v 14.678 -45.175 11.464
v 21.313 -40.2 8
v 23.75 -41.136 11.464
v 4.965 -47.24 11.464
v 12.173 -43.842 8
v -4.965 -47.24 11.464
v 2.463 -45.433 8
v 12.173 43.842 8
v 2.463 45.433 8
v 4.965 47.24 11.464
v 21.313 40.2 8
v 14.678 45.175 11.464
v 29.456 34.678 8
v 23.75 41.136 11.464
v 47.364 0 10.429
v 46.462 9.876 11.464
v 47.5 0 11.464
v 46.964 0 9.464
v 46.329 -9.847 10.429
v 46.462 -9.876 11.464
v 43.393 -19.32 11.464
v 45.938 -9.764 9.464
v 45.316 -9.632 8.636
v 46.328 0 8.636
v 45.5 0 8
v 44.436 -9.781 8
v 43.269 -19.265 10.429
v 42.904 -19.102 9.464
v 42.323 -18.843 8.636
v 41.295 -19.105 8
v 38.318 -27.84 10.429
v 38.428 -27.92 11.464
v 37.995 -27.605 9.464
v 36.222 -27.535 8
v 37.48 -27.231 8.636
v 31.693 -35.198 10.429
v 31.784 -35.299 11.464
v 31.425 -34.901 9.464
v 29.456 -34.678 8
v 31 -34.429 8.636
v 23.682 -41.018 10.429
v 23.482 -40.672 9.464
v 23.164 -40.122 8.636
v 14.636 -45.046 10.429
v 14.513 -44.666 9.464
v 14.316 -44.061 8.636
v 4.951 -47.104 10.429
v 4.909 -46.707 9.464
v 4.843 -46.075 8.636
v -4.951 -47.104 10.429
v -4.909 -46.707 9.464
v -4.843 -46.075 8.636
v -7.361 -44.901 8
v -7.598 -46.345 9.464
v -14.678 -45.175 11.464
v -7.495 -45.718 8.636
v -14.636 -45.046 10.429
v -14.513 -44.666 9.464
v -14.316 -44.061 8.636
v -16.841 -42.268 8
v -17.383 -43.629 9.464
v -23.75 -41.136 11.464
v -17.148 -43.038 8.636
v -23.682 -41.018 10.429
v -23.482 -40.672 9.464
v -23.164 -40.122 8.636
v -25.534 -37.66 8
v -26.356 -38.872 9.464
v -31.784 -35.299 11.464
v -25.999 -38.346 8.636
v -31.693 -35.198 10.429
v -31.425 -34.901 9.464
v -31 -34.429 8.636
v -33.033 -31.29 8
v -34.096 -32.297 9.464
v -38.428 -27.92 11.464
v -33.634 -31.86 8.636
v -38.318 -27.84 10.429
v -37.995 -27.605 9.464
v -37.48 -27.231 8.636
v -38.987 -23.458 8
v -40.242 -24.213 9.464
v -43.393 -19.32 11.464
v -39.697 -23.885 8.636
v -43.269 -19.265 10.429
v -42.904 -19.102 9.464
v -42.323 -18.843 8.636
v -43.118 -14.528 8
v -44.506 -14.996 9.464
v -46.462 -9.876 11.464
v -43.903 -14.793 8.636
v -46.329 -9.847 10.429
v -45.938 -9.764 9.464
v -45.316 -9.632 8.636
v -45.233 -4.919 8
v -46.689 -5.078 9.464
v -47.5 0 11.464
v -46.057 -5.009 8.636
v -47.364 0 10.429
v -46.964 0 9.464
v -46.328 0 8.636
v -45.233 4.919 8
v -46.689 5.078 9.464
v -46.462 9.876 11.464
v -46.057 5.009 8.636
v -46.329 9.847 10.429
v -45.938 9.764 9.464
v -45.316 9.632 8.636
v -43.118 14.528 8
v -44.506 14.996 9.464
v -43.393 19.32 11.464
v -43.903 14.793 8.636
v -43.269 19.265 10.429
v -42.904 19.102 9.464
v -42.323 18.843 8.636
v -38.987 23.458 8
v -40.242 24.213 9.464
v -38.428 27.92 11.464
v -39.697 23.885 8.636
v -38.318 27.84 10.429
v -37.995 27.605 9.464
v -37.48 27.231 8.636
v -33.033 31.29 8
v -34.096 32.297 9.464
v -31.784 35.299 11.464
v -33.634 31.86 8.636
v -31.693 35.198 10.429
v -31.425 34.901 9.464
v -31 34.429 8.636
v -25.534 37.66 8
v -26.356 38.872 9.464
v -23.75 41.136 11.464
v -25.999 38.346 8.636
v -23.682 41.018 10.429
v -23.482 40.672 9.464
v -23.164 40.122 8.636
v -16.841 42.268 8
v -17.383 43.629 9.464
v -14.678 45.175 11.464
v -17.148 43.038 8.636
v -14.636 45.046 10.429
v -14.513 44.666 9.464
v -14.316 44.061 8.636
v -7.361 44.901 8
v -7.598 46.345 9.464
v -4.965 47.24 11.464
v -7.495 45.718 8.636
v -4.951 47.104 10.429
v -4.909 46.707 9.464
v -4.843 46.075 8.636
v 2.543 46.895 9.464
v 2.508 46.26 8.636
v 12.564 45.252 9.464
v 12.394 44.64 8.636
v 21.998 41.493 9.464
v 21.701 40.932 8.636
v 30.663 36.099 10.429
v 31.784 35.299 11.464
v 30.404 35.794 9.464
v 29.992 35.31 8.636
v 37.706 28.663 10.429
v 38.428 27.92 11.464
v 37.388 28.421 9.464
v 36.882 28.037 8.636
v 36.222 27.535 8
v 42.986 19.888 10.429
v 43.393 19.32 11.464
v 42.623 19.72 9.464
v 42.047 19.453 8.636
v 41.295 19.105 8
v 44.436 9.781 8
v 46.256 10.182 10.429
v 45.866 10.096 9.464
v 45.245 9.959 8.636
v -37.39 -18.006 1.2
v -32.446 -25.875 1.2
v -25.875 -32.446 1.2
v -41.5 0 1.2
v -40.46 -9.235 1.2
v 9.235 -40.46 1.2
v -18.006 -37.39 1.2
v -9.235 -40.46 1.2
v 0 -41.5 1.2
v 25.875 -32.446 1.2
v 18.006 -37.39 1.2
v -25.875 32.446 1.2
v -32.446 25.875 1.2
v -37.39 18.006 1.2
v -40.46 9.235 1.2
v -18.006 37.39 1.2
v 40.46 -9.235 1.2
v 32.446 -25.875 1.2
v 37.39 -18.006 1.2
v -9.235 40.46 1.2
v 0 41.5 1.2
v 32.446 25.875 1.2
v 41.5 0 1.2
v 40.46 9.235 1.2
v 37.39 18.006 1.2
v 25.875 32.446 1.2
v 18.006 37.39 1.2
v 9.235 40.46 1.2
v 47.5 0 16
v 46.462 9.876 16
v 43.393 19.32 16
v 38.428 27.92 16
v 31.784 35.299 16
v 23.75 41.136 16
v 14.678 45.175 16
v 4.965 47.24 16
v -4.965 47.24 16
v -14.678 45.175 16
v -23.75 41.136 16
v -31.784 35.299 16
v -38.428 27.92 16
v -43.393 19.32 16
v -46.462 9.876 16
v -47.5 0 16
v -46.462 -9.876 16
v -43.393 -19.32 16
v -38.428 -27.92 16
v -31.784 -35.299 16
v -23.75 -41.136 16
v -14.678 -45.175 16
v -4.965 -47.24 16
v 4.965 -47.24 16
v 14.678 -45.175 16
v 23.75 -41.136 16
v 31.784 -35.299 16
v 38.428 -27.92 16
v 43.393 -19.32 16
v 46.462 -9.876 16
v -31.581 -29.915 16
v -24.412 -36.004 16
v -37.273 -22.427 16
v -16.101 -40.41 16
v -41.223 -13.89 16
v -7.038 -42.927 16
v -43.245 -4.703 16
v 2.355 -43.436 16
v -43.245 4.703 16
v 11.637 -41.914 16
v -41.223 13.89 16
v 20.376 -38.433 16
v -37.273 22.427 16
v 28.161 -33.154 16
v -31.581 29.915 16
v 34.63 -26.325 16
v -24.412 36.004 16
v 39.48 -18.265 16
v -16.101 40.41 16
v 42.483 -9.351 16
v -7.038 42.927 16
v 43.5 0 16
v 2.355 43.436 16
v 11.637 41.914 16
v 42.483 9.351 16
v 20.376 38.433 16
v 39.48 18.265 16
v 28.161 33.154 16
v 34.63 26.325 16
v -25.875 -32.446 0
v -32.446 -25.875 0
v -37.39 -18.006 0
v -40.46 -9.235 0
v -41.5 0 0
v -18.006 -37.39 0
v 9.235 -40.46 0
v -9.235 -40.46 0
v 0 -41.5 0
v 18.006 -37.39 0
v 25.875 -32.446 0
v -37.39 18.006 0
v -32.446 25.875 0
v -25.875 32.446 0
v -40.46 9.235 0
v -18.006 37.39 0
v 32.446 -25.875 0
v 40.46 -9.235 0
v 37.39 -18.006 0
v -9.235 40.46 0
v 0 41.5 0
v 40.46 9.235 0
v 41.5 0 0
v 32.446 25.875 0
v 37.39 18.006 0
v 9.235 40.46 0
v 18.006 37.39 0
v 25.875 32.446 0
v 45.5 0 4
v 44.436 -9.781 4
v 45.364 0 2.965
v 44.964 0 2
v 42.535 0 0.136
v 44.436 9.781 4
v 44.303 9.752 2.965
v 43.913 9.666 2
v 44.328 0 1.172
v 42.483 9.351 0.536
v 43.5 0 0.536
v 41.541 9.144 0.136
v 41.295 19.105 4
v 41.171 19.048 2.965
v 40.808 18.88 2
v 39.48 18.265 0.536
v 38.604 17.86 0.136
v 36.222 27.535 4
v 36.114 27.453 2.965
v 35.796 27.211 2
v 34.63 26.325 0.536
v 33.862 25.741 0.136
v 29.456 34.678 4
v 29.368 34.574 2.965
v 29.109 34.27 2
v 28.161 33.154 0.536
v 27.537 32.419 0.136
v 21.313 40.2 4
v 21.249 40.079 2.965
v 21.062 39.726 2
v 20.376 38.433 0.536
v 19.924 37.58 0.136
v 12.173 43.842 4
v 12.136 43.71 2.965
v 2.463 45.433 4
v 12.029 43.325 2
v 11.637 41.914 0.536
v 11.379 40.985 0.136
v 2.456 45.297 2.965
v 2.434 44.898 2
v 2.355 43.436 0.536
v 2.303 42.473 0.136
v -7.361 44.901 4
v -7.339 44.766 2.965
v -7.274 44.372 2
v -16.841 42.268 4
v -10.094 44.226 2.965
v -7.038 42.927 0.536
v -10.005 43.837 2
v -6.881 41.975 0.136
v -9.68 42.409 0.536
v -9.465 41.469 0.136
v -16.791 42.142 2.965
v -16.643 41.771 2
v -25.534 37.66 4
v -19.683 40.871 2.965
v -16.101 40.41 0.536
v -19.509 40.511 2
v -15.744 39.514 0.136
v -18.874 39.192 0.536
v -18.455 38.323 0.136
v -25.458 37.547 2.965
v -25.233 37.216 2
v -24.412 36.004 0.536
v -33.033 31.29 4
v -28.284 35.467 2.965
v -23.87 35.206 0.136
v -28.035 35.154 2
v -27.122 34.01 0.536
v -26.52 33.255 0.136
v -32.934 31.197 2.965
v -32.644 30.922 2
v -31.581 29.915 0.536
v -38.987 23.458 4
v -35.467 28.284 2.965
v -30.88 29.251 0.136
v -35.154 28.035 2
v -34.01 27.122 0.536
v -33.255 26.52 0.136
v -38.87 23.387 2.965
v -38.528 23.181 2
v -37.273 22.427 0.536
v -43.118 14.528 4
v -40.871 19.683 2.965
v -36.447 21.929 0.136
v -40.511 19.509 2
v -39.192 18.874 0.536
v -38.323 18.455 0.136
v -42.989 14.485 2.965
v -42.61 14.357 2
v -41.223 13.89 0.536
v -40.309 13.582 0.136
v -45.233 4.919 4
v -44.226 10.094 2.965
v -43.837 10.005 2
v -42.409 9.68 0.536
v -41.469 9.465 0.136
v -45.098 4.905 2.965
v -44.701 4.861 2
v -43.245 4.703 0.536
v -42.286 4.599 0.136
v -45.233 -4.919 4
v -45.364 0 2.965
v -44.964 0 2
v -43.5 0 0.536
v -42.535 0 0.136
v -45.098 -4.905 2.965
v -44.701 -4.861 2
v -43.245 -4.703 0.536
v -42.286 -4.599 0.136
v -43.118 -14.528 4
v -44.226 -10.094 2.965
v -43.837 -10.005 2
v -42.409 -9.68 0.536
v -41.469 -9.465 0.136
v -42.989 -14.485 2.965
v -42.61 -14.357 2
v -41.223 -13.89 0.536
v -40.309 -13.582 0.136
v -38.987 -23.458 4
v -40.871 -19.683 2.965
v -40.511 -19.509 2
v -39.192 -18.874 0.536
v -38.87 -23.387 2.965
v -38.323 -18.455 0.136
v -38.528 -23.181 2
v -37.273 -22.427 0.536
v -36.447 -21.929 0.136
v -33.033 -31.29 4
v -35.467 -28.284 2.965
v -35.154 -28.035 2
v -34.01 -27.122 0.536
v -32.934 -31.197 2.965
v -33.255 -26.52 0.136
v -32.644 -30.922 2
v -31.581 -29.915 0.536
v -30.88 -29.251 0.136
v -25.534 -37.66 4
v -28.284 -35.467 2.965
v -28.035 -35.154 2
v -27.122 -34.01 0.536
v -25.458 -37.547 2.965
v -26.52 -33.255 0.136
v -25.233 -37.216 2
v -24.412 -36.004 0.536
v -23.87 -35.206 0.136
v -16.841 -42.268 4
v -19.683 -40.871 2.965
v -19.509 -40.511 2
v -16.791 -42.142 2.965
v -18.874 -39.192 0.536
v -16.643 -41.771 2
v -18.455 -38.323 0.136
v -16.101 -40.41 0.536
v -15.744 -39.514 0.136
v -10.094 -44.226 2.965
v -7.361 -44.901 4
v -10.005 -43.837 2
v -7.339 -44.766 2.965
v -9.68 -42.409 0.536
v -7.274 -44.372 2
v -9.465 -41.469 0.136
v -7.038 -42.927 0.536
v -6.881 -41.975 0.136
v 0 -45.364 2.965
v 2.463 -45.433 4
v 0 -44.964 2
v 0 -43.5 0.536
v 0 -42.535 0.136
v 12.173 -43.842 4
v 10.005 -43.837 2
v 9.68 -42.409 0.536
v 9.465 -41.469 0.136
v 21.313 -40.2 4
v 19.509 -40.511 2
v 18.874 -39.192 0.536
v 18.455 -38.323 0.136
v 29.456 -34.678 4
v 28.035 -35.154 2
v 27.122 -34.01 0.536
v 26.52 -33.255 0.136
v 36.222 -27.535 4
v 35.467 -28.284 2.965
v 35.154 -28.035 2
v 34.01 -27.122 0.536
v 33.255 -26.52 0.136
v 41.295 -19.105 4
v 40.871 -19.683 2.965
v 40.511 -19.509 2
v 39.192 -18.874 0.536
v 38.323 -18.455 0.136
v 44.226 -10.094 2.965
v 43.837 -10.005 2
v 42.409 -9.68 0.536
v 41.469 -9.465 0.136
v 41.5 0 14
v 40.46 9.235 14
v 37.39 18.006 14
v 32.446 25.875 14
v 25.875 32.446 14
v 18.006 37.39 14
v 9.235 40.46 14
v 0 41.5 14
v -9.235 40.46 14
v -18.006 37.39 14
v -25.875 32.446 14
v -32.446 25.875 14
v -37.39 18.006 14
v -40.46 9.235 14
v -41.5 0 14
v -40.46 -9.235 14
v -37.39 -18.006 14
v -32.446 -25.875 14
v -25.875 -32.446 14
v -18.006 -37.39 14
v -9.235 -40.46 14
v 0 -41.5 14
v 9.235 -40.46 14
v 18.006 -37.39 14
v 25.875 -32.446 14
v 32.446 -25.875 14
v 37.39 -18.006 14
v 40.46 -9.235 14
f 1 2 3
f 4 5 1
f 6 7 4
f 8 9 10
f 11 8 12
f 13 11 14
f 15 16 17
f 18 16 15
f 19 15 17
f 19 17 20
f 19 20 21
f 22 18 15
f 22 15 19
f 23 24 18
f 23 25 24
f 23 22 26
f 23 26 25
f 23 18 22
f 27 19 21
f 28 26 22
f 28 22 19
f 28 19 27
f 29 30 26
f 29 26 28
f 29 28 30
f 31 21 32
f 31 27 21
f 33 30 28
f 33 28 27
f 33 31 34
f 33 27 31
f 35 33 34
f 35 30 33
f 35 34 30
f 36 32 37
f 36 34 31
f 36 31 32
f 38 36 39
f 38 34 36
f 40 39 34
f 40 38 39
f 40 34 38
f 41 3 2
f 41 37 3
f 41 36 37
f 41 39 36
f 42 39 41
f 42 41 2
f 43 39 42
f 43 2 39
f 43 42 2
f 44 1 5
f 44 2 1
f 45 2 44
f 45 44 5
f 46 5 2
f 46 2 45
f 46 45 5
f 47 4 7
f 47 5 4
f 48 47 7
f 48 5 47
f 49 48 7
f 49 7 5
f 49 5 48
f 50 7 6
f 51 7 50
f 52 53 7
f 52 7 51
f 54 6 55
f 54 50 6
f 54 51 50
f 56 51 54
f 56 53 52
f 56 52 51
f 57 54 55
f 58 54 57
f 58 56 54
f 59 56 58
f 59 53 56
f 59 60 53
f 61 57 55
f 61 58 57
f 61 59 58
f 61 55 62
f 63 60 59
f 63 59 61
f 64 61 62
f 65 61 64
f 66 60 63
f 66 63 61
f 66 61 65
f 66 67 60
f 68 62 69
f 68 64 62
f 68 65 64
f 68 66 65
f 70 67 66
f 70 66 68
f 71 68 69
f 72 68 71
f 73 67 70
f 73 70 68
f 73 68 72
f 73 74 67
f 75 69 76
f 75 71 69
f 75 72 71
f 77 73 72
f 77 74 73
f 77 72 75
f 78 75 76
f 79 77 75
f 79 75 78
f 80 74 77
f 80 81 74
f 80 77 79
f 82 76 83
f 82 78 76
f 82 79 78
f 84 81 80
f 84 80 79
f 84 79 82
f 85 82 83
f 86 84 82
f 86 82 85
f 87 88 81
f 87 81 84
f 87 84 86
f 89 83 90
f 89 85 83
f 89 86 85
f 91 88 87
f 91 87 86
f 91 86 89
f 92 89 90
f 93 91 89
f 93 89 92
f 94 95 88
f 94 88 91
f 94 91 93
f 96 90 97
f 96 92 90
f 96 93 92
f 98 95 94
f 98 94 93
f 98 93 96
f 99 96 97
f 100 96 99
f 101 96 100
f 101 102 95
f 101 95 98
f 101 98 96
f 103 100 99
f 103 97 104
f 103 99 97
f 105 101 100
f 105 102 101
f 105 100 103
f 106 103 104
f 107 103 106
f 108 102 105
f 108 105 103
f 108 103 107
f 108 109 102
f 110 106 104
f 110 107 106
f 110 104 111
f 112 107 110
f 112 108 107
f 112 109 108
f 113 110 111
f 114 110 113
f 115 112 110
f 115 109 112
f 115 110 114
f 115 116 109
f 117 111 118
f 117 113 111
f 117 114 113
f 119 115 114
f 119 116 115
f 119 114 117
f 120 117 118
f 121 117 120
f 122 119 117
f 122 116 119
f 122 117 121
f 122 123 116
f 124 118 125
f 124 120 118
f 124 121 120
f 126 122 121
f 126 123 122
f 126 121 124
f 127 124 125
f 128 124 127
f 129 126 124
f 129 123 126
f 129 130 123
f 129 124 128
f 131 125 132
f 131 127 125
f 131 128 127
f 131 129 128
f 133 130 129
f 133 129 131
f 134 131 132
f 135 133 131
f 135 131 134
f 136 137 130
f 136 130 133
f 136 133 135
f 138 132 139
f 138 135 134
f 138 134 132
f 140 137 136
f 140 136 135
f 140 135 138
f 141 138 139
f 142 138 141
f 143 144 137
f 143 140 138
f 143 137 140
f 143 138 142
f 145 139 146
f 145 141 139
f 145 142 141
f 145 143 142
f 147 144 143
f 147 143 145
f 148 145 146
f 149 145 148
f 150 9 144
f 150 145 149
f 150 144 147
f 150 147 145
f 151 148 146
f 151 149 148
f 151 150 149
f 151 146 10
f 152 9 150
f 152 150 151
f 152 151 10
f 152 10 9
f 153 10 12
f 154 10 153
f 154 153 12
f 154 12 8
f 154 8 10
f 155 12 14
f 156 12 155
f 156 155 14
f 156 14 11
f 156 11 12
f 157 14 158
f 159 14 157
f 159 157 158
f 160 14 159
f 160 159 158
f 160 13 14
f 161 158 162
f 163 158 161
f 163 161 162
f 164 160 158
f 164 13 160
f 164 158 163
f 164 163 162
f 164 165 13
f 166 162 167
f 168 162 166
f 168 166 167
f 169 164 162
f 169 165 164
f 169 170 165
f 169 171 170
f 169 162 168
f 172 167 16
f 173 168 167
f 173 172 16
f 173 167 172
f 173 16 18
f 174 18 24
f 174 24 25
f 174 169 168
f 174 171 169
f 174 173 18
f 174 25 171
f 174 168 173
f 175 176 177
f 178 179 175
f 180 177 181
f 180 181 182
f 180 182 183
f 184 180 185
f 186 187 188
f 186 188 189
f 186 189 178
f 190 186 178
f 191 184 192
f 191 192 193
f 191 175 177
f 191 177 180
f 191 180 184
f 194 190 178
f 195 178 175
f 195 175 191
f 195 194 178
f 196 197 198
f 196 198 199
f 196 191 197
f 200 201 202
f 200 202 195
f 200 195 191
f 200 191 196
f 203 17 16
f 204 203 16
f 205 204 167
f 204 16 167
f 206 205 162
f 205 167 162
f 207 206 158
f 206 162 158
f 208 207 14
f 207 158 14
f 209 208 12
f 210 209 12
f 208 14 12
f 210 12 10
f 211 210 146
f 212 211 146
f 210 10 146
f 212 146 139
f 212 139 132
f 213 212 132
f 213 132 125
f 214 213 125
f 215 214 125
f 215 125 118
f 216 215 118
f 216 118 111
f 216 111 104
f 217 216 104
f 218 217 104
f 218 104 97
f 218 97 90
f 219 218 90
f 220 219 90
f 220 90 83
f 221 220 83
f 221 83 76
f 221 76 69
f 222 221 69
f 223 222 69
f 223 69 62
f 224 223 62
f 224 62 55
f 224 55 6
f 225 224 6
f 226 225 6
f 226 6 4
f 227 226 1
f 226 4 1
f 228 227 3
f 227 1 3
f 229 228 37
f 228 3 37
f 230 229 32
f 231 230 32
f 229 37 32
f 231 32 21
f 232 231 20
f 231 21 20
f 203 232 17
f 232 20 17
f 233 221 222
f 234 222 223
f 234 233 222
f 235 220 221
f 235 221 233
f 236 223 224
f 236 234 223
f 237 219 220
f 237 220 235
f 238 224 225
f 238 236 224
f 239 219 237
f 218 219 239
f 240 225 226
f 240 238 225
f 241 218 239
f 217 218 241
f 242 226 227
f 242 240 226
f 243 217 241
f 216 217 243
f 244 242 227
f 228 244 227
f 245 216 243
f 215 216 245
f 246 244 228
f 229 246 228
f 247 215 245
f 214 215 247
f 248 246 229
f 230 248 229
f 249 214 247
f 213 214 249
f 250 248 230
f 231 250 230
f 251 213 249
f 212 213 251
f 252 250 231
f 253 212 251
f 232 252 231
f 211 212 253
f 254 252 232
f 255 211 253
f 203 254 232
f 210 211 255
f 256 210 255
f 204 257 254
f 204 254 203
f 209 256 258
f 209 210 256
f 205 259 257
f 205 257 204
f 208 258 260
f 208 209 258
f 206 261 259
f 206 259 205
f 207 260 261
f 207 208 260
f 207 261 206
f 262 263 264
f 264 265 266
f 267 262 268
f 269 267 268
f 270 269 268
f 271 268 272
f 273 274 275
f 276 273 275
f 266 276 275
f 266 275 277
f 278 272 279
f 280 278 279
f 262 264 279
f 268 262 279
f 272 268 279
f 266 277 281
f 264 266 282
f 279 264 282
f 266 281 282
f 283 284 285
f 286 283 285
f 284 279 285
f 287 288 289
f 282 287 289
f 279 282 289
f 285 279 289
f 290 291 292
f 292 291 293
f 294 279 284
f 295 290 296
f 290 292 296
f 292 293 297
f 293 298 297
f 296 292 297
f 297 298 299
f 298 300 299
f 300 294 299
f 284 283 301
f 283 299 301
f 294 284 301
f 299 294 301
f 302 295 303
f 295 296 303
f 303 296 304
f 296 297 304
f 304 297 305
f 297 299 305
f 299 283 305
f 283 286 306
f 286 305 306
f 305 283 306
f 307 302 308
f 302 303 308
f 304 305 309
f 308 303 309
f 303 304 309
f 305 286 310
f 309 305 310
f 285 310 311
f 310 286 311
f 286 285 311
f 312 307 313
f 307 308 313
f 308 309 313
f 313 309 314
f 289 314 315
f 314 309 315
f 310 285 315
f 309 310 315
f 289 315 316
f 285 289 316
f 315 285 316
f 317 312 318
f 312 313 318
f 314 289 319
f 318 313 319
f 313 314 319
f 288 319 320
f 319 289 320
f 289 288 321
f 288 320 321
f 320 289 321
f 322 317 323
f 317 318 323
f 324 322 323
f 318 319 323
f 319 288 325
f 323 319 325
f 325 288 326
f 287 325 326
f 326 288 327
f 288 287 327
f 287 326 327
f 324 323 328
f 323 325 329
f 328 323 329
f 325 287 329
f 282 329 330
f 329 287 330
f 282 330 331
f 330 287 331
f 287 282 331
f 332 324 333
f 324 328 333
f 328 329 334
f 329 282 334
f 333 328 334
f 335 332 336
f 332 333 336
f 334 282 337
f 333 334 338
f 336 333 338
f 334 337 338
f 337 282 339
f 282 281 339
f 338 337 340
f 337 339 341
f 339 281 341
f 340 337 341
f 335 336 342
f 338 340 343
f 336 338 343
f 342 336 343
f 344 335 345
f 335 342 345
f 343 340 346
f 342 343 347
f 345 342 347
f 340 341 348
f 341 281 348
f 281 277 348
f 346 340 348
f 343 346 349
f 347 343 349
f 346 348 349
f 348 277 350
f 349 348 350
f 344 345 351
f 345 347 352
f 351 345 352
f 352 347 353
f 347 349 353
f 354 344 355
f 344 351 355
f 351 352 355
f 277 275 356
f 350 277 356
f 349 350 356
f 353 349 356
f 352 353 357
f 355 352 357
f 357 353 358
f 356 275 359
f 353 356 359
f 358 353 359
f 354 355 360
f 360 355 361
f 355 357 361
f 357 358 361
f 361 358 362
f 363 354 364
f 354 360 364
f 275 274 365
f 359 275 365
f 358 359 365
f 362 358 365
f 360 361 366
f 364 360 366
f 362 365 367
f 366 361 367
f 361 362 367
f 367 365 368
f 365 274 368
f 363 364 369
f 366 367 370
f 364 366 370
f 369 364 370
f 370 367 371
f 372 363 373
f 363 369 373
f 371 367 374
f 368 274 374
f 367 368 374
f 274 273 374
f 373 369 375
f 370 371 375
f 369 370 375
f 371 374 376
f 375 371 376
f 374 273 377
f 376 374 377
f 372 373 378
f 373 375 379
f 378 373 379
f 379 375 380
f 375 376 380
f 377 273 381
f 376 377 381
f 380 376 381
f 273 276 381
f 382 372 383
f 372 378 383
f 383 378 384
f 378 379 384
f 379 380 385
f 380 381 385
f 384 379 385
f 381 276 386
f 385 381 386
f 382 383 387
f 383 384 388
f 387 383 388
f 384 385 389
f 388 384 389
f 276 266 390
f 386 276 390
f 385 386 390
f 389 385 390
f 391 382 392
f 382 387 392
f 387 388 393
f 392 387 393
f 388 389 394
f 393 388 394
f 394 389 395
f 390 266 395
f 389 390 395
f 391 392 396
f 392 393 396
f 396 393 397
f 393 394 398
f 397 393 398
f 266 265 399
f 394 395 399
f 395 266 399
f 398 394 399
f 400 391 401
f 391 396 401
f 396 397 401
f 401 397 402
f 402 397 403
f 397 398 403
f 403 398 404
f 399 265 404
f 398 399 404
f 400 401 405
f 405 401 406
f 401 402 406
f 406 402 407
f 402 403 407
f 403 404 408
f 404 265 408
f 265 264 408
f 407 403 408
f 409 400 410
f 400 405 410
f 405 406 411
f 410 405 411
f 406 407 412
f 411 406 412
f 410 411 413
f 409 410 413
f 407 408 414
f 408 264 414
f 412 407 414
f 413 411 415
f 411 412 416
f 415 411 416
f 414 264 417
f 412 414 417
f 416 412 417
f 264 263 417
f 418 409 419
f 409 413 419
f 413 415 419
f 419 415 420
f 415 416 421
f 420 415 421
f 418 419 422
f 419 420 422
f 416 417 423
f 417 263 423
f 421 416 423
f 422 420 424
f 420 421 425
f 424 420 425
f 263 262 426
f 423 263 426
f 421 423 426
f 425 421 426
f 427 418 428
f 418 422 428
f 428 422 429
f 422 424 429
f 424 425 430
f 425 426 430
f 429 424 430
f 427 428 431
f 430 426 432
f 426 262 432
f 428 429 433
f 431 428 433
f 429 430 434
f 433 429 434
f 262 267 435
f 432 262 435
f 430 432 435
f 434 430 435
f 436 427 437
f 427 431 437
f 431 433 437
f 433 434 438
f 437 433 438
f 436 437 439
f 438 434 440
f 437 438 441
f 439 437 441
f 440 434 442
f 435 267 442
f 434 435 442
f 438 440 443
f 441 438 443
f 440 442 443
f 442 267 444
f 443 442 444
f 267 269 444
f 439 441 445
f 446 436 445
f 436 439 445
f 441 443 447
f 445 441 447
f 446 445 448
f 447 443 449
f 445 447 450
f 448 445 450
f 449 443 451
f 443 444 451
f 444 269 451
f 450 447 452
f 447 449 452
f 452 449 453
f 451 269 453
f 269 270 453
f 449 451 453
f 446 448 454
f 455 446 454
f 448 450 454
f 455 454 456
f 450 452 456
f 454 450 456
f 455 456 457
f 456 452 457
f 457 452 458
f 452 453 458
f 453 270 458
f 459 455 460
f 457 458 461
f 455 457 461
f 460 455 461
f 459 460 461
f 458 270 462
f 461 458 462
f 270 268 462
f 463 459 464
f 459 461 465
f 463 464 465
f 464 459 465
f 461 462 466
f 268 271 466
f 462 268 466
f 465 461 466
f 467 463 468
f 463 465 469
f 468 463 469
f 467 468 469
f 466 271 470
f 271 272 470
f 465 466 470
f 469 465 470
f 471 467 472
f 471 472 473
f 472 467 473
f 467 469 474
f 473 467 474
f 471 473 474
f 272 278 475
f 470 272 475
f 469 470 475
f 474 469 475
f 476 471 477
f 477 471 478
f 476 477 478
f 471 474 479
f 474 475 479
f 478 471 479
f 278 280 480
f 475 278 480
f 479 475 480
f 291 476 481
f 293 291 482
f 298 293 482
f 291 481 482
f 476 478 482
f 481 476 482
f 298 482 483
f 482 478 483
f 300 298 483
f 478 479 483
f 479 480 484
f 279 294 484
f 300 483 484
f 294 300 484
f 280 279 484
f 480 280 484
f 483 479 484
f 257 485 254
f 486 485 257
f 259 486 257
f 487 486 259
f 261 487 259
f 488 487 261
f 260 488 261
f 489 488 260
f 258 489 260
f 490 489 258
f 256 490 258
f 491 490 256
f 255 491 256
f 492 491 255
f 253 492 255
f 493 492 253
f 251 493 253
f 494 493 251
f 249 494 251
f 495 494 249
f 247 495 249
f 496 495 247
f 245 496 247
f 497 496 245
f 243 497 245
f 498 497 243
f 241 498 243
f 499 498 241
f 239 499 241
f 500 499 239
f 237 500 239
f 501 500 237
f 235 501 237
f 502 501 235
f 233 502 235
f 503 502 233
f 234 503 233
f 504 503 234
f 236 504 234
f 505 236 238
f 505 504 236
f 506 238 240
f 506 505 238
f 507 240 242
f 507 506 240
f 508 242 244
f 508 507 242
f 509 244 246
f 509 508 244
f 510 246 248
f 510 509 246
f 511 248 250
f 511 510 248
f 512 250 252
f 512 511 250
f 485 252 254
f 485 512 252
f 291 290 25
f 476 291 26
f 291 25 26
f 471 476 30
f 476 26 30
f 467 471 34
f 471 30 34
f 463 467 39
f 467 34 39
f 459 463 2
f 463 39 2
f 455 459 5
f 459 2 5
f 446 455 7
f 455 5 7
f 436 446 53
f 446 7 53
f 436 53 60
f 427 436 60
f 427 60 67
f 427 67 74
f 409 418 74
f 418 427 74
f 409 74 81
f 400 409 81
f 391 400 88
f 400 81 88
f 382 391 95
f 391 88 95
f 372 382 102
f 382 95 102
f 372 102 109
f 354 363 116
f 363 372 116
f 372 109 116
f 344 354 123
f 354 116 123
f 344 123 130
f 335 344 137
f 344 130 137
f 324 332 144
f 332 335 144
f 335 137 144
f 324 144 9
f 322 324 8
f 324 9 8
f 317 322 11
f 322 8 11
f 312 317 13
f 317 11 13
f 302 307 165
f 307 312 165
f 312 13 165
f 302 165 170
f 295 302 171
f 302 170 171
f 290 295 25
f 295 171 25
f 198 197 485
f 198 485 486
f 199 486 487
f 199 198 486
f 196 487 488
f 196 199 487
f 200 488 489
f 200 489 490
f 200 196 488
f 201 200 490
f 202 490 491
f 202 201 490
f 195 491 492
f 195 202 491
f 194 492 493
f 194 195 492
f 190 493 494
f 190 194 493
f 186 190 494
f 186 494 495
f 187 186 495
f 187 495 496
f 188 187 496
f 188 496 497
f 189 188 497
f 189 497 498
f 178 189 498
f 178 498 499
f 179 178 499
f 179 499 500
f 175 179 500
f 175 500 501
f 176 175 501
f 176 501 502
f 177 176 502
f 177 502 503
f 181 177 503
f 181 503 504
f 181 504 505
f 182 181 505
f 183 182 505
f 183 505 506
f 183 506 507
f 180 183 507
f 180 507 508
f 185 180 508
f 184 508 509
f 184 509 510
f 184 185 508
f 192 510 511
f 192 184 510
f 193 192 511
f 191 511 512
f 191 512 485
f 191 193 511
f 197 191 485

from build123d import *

# Parameters (mm, degrees)
F0_R     = 47.5
F0_R_2   = 41.5
F1_DEPTH = 16
F2_DEPTH = 1.2
F3_SIZE  = 2
F4_R     = 48.436615
F4_R_2   = 47.5
F4_R_3   = 45.5
F5_DEPTH = 8


# Not quite as in the source:
# - a fillet or chamfer that OpenCascade refuses, or shapes differently, is made with other operations: its cross-section is extruded or revolved along the edge and cut away or added


with BuildPart() as f1:
    # F0 (on Top) → F1 (new body)
    with BuildSketch(Plane.XY):
        Circle(F0_R)
        Circle(F0_R_2, mode=Mode.SUBTRACT)
    extrude(amount=F1_DEPTH)

    # F0 (on Top) → F2 (join)
    with BuildSketch(Plane.XY):
        Circle(F0_R_2)
    extrude(amount=F2_DEPTH)

    # F3
    f3_edges = [f1.edges().sort_by_distance(p)[0] for p in [
        (-41.5, 0, 16),
    ]]
    chamfer(f3_edges, length=F3_SIZE)

    # F4 (on face) → F5 (cut, symmetric)
    with BuildSketch(Plane(origin=(0, 0, 0), x_dir=(1, 0, 0), z_dir=(0, 0, -1))):
        Circle(F4_R)
        Circle(F4_R_2, mode=Mode.SUBTRACT)
        Circle(F4_R_2)
        Circle(F4_R_3, mode=Mode.SUBTRACT)
    extrude(amount=F5_DEPTH, both=True, mode=Mode.SUBTRACT)

    # F6: fillet of radius 4 on 2 edges, made by hand

    # F6_s1 → F6_t2 (revolve, cut)
    with BuildSketch(Plane.XZ):
        with BuildLine():
            ThreePointArc((47.5, 11.4641016151), (46.9641016151, 9.4641016151), (45.5, 8))
            Line((45.5, 8), (47.5, 8))
            Line((47.5, 8), (47.5, 11.4641016151))
        make_face()
    revolve(axis=Axis((0, 0, 8), (0, 0, -1)), mode=Mode.SUBTRACT)

    # F6_s3 → F6_t4 (revolve, cut)
    with BuildSketch(Plane.XZ):
        with BuildLine():
            ThreePointArc((45.5, 4), (44.3284271247, 1.1715728753), (41.5, 0))
            Line((41.5, 0), (45.5, 0))
            Line((45.5, 0), (45.5, 4))
        make_face()
    revolve(axis=Axis((0, 0, 0), (0, 0, 1)), mode=Mode.SUBTRACT)


solid = f1.part
